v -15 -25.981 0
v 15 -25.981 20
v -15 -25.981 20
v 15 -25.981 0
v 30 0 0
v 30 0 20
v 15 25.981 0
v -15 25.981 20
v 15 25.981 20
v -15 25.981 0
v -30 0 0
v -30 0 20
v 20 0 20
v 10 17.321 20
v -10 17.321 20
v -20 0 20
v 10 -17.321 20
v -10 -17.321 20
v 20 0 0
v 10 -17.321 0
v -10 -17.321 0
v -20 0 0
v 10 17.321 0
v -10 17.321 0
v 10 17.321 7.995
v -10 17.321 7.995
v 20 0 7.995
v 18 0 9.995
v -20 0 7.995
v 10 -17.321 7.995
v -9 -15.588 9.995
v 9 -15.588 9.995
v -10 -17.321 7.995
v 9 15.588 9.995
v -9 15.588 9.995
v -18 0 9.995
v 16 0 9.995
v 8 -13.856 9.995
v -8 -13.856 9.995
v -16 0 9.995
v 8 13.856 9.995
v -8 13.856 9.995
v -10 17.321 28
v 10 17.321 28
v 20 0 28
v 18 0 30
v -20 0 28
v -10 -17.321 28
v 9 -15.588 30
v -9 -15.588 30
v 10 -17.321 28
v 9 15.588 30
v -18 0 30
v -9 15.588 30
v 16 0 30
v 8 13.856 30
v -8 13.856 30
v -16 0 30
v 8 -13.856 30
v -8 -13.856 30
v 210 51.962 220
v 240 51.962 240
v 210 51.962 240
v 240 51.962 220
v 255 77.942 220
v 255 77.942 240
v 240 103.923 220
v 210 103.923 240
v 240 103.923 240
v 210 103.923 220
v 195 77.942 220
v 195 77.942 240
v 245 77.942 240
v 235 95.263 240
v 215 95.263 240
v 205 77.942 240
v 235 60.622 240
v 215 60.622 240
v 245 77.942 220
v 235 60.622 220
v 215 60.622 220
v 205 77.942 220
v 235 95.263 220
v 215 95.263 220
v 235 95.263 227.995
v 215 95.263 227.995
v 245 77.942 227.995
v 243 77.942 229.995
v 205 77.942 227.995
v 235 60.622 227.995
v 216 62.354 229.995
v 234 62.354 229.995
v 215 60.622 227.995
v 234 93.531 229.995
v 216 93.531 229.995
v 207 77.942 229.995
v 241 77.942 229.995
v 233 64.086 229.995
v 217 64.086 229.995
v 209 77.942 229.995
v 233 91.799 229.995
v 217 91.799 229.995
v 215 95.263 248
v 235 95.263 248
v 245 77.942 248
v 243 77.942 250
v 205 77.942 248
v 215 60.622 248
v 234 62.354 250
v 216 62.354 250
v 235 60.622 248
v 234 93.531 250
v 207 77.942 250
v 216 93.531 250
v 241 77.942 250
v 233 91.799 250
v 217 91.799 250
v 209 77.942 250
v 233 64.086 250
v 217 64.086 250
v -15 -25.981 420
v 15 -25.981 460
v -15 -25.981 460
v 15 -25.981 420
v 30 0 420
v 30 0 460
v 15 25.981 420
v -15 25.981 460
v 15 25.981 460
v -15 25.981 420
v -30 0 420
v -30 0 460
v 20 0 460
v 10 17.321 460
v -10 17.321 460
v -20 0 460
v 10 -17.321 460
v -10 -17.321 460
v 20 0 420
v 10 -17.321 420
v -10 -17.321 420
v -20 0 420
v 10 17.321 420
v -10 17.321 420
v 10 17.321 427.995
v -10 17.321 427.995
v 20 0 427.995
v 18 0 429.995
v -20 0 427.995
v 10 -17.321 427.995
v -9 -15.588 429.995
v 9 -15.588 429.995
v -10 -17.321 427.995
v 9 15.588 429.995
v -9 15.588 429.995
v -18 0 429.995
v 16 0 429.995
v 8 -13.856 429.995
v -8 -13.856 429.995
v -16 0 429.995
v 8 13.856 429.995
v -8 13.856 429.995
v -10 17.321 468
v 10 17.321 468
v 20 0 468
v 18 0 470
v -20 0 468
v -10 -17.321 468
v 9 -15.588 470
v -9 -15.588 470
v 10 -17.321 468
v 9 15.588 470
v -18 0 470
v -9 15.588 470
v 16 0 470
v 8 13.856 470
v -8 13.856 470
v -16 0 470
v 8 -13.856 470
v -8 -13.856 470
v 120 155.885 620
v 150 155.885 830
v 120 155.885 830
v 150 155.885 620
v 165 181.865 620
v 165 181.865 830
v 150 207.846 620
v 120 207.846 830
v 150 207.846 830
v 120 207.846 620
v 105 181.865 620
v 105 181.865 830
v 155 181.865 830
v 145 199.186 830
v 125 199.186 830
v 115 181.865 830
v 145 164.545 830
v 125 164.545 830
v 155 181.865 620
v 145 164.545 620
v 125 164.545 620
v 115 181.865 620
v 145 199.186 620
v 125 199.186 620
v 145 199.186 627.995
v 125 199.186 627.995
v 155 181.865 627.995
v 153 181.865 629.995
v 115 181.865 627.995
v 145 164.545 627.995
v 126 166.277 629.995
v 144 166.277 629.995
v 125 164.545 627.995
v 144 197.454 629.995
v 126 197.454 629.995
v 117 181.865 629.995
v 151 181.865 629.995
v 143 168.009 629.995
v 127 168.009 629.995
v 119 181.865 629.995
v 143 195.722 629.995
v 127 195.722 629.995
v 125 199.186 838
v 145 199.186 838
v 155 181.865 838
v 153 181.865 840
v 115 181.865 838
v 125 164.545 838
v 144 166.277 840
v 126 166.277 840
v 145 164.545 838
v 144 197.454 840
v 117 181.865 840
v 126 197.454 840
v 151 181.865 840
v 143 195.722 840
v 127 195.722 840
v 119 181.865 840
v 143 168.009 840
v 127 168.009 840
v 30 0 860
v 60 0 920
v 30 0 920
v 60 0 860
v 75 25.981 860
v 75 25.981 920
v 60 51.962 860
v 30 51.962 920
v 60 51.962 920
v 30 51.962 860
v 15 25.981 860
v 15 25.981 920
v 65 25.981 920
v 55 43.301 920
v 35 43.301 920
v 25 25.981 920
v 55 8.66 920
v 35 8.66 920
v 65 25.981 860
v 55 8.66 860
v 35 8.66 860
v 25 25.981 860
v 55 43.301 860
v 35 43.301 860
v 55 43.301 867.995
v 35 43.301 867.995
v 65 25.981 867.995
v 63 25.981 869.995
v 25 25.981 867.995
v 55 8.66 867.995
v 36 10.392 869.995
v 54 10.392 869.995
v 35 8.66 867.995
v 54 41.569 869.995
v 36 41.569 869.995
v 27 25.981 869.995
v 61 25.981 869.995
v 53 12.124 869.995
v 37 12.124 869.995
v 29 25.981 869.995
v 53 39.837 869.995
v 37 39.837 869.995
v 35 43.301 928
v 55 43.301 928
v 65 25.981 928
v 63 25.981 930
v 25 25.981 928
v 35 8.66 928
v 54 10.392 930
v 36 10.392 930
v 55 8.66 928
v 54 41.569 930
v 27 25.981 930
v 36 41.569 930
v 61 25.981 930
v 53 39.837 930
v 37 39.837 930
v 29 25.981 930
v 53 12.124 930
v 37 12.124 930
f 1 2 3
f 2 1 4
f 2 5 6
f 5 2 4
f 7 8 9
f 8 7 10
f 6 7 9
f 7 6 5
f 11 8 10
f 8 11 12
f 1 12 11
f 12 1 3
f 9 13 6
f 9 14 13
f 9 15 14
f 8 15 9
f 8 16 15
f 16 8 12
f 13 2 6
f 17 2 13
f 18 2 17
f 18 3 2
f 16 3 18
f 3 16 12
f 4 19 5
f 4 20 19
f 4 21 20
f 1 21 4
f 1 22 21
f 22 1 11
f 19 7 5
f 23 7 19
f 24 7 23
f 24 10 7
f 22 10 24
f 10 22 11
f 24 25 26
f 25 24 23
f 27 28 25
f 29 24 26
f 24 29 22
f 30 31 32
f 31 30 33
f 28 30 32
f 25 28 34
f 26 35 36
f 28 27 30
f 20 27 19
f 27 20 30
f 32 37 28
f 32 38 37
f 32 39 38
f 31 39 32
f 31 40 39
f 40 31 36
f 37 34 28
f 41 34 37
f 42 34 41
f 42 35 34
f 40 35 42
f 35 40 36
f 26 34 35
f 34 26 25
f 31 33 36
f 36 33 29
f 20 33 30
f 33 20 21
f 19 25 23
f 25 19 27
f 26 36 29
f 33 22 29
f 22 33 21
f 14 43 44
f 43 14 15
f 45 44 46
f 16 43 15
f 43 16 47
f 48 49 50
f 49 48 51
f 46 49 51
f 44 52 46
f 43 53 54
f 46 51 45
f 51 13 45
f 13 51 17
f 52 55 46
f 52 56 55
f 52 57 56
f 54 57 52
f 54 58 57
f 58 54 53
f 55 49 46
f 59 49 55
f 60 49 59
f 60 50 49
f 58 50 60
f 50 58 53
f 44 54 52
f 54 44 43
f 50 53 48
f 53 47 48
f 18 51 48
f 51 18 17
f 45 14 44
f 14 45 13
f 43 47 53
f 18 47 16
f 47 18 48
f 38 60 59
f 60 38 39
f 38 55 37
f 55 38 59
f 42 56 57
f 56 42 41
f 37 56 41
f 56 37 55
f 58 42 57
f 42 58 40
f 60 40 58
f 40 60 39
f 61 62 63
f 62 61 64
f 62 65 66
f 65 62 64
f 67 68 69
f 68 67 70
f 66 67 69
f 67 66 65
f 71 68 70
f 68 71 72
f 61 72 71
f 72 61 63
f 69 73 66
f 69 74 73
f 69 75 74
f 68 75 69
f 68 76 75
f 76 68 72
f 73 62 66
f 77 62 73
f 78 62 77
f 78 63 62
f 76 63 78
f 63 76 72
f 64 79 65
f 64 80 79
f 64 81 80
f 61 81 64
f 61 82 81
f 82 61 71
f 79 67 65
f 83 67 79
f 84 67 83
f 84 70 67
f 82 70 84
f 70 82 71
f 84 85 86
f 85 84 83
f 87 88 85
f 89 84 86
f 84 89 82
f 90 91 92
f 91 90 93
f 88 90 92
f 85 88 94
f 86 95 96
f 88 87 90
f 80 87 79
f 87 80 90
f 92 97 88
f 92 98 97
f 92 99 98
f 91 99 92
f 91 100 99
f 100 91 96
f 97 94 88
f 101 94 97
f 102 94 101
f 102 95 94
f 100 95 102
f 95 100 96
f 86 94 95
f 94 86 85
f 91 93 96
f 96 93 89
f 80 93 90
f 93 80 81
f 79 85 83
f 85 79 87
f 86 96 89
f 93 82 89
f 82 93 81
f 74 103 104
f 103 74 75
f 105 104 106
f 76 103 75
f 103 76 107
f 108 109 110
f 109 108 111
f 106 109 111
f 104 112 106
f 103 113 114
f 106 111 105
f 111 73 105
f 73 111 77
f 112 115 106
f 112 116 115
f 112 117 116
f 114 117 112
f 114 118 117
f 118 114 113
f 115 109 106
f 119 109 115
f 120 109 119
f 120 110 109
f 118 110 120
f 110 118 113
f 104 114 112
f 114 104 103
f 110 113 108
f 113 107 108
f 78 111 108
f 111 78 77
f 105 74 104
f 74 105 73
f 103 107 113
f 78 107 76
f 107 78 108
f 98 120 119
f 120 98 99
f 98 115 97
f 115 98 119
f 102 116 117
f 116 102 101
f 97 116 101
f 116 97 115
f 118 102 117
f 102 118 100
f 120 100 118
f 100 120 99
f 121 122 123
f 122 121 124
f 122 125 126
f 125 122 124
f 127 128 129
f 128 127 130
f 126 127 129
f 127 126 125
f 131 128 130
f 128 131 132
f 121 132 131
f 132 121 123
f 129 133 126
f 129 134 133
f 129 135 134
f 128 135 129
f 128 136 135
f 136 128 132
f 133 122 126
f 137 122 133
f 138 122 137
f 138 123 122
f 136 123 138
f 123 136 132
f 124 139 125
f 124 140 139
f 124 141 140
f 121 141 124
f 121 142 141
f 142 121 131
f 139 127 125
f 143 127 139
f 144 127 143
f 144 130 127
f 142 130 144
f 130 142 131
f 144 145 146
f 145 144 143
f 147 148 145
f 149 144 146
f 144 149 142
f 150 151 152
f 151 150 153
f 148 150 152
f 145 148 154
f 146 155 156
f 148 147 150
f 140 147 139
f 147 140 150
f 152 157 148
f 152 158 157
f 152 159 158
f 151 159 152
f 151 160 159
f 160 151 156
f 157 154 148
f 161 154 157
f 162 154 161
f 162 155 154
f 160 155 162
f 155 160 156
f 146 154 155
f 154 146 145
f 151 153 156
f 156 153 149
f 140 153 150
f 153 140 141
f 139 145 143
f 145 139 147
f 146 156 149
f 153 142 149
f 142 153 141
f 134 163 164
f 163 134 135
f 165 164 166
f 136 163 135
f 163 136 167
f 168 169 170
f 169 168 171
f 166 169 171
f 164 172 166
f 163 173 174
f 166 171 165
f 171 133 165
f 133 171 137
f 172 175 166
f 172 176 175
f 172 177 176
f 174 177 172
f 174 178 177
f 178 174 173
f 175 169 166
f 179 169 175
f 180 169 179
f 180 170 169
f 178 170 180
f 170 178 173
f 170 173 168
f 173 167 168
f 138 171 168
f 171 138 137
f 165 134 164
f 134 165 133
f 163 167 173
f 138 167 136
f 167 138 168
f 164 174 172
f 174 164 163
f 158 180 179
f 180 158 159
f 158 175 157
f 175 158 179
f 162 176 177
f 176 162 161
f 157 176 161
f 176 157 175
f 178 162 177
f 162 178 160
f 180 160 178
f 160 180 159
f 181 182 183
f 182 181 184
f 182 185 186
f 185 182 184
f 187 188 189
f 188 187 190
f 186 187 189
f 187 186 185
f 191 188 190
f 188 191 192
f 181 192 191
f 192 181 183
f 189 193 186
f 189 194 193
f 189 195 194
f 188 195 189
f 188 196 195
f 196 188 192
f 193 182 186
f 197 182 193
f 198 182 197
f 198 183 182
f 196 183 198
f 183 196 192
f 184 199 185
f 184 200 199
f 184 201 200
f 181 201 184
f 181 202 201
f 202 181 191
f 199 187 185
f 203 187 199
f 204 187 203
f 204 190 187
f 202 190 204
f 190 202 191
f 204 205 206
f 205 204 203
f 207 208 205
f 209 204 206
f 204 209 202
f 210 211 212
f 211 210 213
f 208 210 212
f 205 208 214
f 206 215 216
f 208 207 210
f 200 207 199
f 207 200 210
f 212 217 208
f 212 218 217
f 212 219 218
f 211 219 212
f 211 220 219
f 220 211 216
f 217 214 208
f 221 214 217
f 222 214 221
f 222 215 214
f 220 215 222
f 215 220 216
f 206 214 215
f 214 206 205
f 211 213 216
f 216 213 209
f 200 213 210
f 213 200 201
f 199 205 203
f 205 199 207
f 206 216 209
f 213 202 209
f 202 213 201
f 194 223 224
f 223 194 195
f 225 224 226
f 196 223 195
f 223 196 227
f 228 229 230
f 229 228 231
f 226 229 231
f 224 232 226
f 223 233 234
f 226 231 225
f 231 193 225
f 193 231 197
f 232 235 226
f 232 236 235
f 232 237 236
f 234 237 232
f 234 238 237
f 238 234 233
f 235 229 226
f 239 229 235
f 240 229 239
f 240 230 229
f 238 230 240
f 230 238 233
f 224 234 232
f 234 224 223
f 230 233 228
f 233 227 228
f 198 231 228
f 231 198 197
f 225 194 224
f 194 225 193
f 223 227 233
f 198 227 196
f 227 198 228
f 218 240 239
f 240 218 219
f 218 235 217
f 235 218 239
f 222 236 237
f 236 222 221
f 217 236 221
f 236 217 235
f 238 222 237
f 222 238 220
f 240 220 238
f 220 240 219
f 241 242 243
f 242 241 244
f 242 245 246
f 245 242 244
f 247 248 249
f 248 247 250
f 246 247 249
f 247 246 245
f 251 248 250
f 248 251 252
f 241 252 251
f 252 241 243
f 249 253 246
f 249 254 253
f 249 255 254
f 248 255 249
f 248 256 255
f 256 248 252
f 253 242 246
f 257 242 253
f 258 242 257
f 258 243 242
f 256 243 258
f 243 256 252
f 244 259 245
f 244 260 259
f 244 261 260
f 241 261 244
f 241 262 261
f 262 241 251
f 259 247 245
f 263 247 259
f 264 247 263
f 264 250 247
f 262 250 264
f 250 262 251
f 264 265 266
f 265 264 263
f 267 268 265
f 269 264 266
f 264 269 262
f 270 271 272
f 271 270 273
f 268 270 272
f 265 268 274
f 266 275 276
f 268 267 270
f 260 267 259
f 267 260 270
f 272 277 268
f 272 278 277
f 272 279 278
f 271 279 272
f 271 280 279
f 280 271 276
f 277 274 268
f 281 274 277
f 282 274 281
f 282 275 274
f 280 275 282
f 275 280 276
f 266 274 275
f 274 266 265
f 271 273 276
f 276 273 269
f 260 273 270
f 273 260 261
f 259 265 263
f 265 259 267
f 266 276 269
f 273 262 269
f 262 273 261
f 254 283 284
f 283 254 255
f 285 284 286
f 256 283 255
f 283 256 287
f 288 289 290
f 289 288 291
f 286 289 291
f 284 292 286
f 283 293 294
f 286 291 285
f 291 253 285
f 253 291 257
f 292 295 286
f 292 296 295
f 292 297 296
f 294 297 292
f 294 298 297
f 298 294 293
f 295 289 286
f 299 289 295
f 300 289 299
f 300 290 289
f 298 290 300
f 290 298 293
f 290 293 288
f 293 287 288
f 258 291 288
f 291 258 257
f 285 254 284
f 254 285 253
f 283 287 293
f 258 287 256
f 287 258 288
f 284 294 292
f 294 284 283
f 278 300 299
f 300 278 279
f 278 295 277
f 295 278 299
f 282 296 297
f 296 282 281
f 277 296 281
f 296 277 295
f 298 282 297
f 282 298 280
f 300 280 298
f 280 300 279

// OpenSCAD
// file: ../../utils/animate.scad
// Copyright (c) 2017 Clément Bœsch <u pkh.me>
//
// Permission to use, copy, modify, and distribute this software for any
// purpose with or without fee is hereby granted, provided that the above
// copyright notice and this permission notice appear in all copies.
//
// THE SOFTWARE IS PROVIDED "AS IS" AND THE AUTHOR DISCLAIMS ALL WARRANTIES
// WITH REGARD TO THIS SOFTWARE INCLUDING ALL IMPLIED WARRANTIES OF
// MERCHANTABILITY AND FITNESS. IN NO EVENT SHALL THE AUTHOR BE LIABLE FOR
// ANY SPECIAL, DIRECT, INDIRECT, OR CONSEQUENTIAL DAMAGES OR ANY DAMAGES
// WHATSOEVER RESULTING FROM LOSS OF USE, DATA OR PROFITS, WHETHER IN AN
// ACTION OF CONTRACT, NEGLIGENCE OR OTHER TORTIOUS ACTION, ARISING OUT OF
// OR IN CONNECTION WITH THE USE OR PERFORMANCE OF THIS SOFTWARE.

module stack_animate(time, pad=40, axis=[0,0,1]) {
    function slope_a(x1, y1, x2, y2) = (y1 - y2) / (x1 - x2);
    function slope_b(x1, y1, x2, y2) = (x1*y2 - x2*y1) / (x1 - x2);
    function clip_time(t, mint, maxt) = min(max(t, mint), maxt);

    for (i = [0:$children-1]) {
        start_pos = (i + 1) * pad;
        end_pos = 0;
        start_time = i / $children;
        end_time = (i + 1) / $children;
        a = slope_a(start_time, start_pos, end_time, end_pos);
        b = slope_b(start_time, start_pos, end_time, end_pos);
        t = clip_time(time, start_time, end_time);
        translate(axis * (a*t + b))
            children(i);
    }
}
// main file
// Copyright (c) 2017 Clément Bœsch <u pkh.me>
//
// Permission to use, copy, modify, and distribute this software for any
// purpose with or without fee is hereby granted, provided that the above
// copyright notice and this permission notice appear in all copies.
//
// THE SOFTWARE IS PROVIDED "AS IS" AND THE AUTHOR DISCLAIMS ALL WARRANTIES
// WITH REGARD TO THIS SOFTWARE INCLUDING ALL IMPLIED WARRANTIES OF
// MERCHANTABILITY AND FITNESS. IN NO EVENT SHALL THE AUTHOR BE LIABLE FOR
// ANY SPECIAL, DIRECT, INDIRECT, OR CONSEQUENTIAL DAMAGES OR ANY DAMAGES
// WHATSOEVER RESULTING FROM LOSS OF USE, DATA OR PROFITS, WHETHER IN AN
// ACTION OF CONTRACT, NEGLIGENCE OR OTHER TORTIOUS ACTION, ARISING OUT OF
// OR IN CONNECTION WITH THE USE OR PERFORMANCE OF THIS SOFTWARE.

use <../../utils/animate.scad>

delta = 0.005;

hexago_r = 20;
hexago_thick = hexago_r / 2;

function _height(level=1) = hexago_thick * (level + 1);

module hexago_pos(p=[0,0,0]) {
    r0 =               hexago_r;
    r1 = sqrt(3) / 2 * hexago_r;
    tx =               hexago_thick;
    ty = sqrt(3) / 2 * hexago_thick;
    x_translate = (r0 + tx) * 3/2;
    y_translate = (r1 + ty) * 2;
    odd_y_offset = r1 + ty;

    x = p[0] * x_translate;
    y = p[1] * y_translate + (p[0] % 2 ? odd_y_offset : 0);
    z = _height(p[2]);

    translate([x, y, z])
        children();
}

module _hexago() {
    border = hexago_r / 10;
    hull() {
        cylinder(r=hexago_r, h=hexago_thick-border, $fn=6);
        cylinder(r=hexago_r-border, h=hexago_thick, $fn=6);
    }
}

module hexago_block(n=1, m=1, level=1) {
    height = _height(level);
    for (x = [0:n-1]) {
        for (y = [0:m-1]) {
            hexago_pos([x, y]) {
                difference() {
                    union() {
                        translate([0, 0, height]) // male part
                            _hexago();
                        difference() { // female part
                            cylinder(r=hexago_r+hexago_thick, h=height, $fn=6);
                            translate([0, 0, -delta])
                                _hexago();
                        }
                    }
                    cylinder(r=hexago_r-hexago_r/5, h=height + hexago_thick + delta, $fn=6);
                }
            }
        }
    }
}

module _demo() {
    color("orange") hexago_block(6, 4);
    stack_animate(time=$t, pad=200) {
        hexago_pos([5, 1, 1])                hexago_block();
        hexago_pos([0, 0, 1]) color("green") hexago_block(3, 2, level=3);
        hexago_pos([3, 3, 1]) color("pink")  hexago_block(1, 1, level=20);
        hexago_pos([1, 0, 5]) color("red")   hexago_block(4, 1, level=5);
    }
}

mod = "demo";

if      (mod == "8x5x1") hexago_block(8, 5, level=1);
else if (mod == "3x2x3") hexago_block(3, 2, level=3);
else if (mod == "1x1x5") hexago_block(1, 1, level=5);
else if (mod == "1x1x1") hexago_block(1, 1, level=1);
else
    _demo();
